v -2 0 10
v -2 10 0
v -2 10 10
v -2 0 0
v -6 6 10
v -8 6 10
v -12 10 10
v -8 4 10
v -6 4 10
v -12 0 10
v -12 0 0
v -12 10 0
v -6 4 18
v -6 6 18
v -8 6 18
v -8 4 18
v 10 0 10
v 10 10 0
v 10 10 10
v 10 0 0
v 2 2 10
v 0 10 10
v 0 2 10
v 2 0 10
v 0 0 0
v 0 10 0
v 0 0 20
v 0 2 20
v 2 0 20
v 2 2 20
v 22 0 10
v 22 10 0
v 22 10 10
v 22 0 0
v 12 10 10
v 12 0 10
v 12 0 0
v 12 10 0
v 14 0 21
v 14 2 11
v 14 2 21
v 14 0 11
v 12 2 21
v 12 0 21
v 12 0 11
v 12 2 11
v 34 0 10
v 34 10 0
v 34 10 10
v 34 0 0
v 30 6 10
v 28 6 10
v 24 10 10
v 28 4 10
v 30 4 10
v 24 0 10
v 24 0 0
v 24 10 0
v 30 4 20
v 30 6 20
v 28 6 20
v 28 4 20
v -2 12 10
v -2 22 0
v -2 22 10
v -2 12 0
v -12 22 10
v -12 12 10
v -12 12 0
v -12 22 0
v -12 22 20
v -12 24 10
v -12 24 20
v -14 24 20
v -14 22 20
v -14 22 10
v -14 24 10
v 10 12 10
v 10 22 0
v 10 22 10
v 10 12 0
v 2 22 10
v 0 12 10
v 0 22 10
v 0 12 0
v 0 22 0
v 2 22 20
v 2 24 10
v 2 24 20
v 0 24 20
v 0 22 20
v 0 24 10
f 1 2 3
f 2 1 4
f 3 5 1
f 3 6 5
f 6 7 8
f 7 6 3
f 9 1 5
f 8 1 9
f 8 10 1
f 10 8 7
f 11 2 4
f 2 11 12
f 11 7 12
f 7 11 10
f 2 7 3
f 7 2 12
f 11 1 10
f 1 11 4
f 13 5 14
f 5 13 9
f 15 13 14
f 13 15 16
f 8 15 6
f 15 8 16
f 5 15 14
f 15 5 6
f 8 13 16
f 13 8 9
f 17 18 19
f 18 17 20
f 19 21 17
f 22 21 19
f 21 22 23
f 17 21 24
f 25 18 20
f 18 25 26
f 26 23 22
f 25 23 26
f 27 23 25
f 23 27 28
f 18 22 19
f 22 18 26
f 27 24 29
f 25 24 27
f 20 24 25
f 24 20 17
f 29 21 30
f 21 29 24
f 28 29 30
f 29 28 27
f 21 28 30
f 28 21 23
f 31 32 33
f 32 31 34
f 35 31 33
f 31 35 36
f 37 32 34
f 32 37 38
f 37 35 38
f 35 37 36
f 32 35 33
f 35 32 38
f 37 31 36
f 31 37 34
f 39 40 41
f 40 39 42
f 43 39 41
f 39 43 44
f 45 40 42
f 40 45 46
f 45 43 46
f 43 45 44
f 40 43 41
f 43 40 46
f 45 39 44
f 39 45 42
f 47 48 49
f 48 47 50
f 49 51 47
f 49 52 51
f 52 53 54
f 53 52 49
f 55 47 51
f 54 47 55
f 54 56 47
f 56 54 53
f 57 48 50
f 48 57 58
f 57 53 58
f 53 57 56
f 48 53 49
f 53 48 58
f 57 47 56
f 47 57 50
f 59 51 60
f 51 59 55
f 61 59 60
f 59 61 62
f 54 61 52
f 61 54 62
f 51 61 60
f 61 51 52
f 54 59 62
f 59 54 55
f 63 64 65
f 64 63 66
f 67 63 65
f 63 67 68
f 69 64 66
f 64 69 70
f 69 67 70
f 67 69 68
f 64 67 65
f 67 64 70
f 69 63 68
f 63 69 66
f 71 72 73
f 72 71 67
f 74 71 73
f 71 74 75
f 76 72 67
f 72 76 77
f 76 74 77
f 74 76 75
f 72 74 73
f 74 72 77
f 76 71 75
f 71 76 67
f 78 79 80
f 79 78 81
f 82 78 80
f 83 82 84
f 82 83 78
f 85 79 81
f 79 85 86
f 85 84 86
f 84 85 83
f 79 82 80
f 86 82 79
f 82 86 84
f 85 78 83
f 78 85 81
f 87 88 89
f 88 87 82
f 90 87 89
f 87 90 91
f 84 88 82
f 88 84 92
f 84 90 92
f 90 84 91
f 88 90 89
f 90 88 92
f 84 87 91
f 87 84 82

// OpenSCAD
translate([-12,0,0]) union() {
  cube([10,10,10]);
  translate([4,4,8]) cube([2,2,10]);
}

union() {
  cube([10,10,10]);
  translate([0,0,10]) cube([2,2,10]);
}

translate([12,0,0]) union() {
  cube([10,10,10]);
  translate([0,0,11]) cube([2,2,10]);
}

translate([24,0,0]) union() {
  cube([10,10,10]);
  translate([4,4,10]) cube([2,2,10]);
}

translate([-12,12,0]) union() {
  cube([10,10,10]);
  translate([-2,10,10]) cube([2,2,10]);
}

translate([0,12,0]) union() {
  cube([10,10,10]);
  translate([0,10,10]) cube([2,2,10]);
}
